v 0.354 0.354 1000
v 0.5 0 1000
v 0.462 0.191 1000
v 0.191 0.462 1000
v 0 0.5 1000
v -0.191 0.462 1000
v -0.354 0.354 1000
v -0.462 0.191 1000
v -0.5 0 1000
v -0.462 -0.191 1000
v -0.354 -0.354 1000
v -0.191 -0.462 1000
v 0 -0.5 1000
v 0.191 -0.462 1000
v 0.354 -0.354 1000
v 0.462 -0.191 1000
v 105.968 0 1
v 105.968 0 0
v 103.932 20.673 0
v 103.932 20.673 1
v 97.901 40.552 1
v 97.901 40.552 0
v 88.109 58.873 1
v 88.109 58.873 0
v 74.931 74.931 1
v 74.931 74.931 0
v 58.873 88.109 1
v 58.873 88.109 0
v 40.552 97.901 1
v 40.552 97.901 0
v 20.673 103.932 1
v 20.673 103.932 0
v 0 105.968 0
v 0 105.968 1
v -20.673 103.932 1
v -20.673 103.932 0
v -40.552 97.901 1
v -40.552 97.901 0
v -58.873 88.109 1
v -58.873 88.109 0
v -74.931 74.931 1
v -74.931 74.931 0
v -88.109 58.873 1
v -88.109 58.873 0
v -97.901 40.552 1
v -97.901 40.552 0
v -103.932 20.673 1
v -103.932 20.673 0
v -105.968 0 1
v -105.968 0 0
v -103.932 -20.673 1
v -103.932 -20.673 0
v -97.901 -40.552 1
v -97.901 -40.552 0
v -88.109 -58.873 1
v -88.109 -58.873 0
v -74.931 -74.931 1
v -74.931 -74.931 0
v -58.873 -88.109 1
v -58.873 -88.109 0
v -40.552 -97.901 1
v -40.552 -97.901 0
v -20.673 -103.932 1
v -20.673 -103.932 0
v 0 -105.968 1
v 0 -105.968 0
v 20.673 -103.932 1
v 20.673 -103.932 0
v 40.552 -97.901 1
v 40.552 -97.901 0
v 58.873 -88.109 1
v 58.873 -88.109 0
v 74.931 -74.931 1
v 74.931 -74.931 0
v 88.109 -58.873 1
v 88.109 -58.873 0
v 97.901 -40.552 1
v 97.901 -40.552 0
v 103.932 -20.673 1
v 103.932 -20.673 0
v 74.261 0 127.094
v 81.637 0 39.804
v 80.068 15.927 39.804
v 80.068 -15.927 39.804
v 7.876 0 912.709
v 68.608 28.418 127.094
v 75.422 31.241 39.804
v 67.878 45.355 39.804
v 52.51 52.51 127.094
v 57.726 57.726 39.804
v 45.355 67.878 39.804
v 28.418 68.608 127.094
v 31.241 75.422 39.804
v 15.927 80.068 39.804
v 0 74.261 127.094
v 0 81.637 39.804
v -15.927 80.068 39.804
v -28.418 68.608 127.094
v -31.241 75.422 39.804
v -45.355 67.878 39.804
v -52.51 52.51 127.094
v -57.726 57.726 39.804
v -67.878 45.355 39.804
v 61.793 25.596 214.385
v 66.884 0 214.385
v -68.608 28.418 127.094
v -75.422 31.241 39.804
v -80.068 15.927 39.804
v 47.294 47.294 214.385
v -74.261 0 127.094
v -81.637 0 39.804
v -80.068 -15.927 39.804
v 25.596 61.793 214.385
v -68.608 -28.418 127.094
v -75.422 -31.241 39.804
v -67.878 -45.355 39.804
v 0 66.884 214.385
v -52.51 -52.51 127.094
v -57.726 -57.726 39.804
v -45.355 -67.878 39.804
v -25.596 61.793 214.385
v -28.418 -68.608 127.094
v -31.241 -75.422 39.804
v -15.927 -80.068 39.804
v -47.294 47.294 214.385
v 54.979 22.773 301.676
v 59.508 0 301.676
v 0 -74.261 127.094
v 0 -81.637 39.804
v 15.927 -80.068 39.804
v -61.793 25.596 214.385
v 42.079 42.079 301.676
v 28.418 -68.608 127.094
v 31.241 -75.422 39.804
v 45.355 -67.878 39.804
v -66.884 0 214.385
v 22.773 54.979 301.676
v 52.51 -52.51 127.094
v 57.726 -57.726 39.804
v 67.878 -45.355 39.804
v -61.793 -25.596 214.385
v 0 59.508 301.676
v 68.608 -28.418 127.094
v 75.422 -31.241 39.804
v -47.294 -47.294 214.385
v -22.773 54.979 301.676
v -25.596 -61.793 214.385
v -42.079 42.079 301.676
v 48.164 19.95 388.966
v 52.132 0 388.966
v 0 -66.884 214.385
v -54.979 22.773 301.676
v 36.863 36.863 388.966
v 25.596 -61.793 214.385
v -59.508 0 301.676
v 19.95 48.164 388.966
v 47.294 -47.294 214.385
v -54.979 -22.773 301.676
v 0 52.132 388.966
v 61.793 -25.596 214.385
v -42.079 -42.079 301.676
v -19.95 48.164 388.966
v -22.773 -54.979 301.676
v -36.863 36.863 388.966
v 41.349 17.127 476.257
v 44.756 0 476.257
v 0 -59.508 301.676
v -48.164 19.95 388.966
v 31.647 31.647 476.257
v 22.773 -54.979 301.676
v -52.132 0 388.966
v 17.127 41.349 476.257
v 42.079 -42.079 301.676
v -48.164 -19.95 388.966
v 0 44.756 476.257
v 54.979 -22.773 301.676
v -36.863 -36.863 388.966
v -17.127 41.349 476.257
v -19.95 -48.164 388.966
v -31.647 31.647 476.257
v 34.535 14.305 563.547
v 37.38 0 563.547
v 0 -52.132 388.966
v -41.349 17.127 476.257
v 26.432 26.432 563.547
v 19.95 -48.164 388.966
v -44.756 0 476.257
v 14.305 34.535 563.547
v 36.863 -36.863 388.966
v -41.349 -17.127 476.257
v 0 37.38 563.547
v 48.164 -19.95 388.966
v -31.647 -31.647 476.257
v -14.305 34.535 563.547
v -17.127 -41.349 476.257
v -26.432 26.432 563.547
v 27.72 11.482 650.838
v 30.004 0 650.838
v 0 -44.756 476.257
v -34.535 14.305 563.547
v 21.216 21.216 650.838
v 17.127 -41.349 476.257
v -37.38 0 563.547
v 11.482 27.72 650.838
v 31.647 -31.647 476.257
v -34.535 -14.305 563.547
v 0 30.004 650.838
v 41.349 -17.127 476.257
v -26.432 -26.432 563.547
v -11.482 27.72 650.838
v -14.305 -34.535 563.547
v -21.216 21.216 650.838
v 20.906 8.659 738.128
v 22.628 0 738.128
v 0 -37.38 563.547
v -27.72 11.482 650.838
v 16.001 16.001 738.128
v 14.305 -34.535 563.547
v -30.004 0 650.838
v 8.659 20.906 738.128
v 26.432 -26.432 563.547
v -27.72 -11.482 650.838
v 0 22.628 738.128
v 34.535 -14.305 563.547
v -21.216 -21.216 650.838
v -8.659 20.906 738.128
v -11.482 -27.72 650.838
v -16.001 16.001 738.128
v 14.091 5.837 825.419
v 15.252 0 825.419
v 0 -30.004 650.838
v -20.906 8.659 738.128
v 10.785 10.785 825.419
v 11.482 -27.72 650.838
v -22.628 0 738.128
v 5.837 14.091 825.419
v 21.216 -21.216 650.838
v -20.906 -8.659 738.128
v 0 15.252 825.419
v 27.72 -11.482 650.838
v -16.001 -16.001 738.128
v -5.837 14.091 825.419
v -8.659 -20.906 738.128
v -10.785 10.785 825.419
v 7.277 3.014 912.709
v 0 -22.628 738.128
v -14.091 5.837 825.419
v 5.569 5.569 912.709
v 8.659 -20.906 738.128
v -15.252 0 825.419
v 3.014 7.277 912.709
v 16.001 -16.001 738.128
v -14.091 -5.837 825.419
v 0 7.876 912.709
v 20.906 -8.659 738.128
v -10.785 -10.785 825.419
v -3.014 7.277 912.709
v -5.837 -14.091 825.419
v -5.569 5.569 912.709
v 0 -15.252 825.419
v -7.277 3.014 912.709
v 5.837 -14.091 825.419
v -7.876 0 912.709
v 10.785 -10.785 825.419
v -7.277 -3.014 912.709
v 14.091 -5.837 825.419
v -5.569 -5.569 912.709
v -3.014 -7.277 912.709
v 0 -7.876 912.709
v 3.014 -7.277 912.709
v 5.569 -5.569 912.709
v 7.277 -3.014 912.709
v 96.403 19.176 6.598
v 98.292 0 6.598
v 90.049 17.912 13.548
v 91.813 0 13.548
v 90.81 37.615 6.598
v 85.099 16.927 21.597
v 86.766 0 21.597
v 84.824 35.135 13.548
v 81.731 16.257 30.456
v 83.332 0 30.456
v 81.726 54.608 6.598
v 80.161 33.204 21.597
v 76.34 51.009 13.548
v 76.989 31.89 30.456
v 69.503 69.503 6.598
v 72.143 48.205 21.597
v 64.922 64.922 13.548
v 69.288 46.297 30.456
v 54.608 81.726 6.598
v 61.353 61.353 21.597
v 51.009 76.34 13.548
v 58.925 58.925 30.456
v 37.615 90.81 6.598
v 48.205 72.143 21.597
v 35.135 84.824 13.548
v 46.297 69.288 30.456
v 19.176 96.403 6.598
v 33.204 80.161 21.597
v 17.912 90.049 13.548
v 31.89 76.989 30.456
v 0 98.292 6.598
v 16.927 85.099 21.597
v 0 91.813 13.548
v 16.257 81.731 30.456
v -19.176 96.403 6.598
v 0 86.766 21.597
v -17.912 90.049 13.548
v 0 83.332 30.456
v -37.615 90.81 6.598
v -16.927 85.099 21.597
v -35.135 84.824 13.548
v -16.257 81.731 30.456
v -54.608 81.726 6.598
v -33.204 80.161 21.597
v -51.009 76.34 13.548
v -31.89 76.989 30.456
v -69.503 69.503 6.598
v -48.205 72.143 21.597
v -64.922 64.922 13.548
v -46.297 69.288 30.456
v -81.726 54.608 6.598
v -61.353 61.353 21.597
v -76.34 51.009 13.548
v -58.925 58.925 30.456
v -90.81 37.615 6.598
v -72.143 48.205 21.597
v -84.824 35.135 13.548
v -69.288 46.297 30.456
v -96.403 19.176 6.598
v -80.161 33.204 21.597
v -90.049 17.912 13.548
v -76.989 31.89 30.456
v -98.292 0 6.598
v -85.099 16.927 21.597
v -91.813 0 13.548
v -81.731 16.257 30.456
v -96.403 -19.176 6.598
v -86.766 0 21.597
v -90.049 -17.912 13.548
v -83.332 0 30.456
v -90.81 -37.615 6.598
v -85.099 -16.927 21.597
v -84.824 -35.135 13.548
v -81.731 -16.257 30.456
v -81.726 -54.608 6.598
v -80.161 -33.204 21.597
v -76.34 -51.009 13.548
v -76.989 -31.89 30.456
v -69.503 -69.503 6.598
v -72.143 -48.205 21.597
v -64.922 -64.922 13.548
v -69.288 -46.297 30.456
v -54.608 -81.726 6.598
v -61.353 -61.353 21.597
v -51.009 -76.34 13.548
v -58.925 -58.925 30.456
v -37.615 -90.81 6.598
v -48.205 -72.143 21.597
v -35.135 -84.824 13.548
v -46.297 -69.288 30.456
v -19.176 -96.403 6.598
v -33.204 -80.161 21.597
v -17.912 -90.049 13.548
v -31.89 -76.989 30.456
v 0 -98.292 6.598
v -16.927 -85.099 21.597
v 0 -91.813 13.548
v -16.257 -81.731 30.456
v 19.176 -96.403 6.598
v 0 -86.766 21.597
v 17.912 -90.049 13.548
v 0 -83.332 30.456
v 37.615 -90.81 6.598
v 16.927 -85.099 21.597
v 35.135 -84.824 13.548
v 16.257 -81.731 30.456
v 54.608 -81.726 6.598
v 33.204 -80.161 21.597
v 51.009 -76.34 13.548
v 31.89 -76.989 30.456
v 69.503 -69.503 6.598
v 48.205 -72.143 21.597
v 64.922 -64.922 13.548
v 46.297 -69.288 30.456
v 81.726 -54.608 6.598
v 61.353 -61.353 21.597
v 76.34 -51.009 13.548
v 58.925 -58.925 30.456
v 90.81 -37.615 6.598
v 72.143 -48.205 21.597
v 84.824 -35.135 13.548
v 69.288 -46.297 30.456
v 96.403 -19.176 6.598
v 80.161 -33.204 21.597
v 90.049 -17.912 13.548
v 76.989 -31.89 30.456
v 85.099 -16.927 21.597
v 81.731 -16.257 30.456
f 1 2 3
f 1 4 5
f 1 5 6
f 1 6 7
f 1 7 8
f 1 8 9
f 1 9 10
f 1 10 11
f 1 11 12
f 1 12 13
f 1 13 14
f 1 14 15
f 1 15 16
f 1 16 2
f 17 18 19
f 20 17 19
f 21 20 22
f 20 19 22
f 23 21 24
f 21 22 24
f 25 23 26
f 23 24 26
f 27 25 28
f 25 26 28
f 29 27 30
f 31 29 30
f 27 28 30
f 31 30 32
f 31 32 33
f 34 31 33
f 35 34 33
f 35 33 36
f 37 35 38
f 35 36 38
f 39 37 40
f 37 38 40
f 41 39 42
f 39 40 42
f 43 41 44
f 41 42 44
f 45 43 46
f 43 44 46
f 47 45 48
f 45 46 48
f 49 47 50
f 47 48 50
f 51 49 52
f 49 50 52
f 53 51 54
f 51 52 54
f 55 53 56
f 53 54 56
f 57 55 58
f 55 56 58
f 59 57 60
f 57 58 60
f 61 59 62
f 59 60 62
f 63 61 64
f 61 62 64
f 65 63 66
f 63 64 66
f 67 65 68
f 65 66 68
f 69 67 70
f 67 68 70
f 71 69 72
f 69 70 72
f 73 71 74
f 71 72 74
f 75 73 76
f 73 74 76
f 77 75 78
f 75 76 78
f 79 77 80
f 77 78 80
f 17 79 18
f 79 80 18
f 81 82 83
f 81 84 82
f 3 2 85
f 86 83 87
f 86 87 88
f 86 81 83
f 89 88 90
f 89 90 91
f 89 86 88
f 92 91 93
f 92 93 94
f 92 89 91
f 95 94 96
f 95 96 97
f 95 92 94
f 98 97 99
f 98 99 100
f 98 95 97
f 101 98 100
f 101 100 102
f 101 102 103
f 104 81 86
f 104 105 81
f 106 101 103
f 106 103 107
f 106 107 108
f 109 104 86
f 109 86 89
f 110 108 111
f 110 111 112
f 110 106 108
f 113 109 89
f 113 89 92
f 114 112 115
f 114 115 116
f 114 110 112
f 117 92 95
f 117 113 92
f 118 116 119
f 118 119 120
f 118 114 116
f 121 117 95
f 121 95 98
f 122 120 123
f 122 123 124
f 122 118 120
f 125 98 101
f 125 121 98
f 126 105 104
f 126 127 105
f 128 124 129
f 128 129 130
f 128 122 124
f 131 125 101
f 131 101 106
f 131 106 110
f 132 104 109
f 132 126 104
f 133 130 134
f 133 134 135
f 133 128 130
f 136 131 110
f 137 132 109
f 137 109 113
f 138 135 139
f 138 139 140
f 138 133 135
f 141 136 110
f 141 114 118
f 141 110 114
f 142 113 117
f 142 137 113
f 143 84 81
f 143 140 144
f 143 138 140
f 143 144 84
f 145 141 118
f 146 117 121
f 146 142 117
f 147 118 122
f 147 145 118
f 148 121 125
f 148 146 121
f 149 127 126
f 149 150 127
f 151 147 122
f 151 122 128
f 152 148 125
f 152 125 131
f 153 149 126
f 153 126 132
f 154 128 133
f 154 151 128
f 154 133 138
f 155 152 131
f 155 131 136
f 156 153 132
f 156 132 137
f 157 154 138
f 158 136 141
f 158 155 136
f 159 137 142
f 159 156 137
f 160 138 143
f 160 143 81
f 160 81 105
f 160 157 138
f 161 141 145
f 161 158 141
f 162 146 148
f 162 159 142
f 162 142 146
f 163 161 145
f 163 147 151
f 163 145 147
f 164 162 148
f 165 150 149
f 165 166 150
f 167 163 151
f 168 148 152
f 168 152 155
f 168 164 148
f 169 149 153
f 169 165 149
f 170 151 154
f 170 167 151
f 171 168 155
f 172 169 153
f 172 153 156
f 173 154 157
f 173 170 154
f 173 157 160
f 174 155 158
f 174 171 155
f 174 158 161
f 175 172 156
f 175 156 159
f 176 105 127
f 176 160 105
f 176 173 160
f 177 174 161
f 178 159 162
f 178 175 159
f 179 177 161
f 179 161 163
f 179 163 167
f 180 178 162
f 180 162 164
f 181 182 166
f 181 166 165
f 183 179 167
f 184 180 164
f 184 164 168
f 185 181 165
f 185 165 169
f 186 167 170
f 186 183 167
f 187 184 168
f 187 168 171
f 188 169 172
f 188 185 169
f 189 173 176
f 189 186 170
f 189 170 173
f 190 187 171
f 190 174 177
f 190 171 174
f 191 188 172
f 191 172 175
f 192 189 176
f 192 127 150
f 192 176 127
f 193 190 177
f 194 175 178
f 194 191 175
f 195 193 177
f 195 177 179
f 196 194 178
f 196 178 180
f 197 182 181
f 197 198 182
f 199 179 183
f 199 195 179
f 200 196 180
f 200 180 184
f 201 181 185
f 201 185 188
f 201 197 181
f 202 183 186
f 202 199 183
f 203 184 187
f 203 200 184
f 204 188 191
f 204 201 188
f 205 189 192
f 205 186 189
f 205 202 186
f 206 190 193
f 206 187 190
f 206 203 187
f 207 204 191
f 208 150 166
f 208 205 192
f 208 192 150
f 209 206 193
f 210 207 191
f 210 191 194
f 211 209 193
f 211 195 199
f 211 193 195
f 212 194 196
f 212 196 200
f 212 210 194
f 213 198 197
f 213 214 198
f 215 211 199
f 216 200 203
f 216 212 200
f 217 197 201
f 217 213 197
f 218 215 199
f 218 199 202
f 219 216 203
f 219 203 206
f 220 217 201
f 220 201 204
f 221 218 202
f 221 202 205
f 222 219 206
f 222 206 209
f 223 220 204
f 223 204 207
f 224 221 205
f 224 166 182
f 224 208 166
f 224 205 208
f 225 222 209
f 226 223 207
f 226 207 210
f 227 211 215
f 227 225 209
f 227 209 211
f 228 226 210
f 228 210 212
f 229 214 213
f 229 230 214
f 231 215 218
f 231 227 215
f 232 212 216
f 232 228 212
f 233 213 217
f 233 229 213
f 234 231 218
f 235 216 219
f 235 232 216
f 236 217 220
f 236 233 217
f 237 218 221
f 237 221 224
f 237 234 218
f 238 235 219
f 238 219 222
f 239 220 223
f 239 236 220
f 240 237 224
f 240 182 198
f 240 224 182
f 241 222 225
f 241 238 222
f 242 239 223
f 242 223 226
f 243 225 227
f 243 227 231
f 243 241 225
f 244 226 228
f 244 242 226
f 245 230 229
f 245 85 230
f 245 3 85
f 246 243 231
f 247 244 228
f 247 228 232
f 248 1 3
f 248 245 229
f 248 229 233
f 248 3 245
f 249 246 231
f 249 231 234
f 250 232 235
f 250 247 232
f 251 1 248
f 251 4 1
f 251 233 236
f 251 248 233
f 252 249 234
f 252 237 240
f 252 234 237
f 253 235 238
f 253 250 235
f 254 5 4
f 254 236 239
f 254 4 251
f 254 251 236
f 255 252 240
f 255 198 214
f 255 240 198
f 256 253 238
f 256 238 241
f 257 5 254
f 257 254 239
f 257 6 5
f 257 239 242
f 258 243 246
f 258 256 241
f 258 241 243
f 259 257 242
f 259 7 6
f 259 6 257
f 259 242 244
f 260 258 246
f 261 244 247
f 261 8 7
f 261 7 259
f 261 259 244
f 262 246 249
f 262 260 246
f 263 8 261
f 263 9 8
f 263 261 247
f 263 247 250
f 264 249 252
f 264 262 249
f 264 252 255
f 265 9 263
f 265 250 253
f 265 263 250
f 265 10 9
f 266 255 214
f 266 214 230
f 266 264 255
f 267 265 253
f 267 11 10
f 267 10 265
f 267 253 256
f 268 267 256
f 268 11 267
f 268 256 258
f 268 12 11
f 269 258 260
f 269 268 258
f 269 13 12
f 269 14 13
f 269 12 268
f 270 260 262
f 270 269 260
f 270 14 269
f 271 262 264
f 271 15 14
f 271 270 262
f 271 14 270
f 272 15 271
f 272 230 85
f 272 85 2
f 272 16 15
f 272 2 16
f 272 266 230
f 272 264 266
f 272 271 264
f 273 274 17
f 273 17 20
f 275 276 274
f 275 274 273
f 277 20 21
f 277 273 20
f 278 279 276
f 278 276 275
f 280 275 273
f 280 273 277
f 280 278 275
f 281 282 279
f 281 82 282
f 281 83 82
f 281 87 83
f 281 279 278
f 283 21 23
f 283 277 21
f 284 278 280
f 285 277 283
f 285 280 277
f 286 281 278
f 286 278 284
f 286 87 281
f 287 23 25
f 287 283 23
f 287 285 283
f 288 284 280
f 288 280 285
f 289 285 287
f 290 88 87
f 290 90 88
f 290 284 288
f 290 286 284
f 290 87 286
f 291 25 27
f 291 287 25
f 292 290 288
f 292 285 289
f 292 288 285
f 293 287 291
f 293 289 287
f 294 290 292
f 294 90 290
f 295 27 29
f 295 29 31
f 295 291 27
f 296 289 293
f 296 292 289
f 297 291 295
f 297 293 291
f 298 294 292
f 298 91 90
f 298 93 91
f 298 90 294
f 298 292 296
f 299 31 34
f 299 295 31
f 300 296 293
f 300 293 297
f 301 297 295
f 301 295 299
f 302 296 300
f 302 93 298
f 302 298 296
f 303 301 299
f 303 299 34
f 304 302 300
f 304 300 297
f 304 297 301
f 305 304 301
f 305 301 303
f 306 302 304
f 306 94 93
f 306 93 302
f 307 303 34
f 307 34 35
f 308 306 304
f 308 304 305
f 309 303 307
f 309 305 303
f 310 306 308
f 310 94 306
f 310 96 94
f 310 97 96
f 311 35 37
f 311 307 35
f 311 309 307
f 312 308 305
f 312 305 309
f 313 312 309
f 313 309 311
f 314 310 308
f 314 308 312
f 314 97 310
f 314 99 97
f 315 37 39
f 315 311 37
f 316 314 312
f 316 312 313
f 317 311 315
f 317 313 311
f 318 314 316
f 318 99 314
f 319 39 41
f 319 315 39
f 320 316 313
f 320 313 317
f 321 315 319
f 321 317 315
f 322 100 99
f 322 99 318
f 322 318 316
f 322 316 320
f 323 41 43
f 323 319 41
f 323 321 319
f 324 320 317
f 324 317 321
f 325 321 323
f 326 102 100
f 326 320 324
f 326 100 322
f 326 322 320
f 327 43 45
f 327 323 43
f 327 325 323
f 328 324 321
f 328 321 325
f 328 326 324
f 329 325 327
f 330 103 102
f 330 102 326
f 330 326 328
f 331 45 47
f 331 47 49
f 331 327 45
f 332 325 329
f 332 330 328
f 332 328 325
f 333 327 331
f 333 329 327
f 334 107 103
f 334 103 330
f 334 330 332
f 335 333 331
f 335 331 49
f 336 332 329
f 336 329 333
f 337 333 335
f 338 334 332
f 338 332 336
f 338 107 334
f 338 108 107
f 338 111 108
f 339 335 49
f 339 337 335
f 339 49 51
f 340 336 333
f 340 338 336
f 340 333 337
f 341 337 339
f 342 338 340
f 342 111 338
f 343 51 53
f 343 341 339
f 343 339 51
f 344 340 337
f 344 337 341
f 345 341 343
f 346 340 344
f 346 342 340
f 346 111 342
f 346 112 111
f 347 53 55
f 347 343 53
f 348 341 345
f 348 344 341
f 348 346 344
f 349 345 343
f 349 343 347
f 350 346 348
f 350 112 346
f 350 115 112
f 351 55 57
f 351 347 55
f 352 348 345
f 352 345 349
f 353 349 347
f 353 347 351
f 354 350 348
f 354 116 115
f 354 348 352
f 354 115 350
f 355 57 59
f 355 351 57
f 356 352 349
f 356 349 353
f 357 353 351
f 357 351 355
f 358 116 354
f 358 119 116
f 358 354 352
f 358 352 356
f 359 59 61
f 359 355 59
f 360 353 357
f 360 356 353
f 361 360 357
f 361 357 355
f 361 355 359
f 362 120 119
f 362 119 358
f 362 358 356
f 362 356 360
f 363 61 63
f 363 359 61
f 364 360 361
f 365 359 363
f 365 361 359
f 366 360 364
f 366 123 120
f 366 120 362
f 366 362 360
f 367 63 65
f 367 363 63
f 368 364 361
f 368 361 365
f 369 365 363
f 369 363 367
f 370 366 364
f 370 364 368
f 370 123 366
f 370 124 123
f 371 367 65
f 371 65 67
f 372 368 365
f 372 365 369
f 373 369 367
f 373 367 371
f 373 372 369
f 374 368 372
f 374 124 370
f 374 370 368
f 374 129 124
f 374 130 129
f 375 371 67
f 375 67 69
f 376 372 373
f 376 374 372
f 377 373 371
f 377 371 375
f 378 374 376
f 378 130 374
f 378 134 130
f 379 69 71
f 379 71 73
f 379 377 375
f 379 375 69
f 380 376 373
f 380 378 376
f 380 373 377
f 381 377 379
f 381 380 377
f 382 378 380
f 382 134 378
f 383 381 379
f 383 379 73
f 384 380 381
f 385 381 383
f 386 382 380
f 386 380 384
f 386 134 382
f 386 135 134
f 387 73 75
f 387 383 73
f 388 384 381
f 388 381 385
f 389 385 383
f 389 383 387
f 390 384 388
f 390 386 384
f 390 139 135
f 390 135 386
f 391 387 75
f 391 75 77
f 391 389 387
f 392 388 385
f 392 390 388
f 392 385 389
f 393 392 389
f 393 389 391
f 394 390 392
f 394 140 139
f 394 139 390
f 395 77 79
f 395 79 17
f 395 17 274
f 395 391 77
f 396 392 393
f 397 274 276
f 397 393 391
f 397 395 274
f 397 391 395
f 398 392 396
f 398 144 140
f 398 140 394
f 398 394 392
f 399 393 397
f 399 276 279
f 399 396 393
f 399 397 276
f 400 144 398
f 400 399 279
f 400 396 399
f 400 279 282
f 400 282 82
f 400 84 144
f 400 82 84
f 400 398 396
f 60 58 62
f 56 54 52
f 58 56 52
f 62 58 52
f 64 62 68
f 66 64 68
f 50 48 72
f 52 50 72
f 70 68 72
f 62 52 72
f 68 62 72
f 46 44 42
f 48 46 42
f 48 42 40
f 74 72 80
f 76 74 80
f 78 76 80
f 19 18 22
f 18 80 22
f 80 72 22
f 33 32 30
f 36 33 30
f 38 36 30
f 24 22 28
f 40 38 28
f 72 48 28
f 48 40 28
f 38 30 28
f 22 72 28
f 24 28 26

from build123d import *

# Parameters (mm, degrees)
F0_R     = 85
F2_R     = 0.5
F4_R     = 105.9677495378
F5_DEPTH = 1


# Not quite as in the source:
# - a fillet or chamfer that OpenCascade refuses, or shapes differently, is made with other operations: its cross-section is extruded or revolved along the edge and cut away or added


with BuildPart() as f3:
    # F0 (on Top) → F3 section 0
    with BuildSketch(Plane.XY):
        Circle(F0_R)
    # F2 (on offset) → F3 section 1
    with BuildSketch(Plane.XY.offset(1000)):
        Circle(F2_R)
    loft()

    # F4 (on Top) → F5 (join)
    with BuildSketch(Plane.XY):
        Circle(F4_R)
    extrude(amount=F5_DEPTH)

    # F6: fillet of radius 50 on 1 edges, made by hand

    # F6_s1 → F6_t2 (revolve)
    with BuildSketch(Plane.XZ):
        with BuildLine():
            ThreePointArc((105.9677495378, 1), (89.0977776327, 17.4521656578), (81.6365703283, 39.8039014399))
            Line((81.6365703283, 39.8039014399), (84.9155, 1))
            Line((84.9155, 1), (105.9677495378, 1))
        make_face()
    revolve(axis=Axis((0, 0, 1), (0, 0, 1)))


solid = f3.part
